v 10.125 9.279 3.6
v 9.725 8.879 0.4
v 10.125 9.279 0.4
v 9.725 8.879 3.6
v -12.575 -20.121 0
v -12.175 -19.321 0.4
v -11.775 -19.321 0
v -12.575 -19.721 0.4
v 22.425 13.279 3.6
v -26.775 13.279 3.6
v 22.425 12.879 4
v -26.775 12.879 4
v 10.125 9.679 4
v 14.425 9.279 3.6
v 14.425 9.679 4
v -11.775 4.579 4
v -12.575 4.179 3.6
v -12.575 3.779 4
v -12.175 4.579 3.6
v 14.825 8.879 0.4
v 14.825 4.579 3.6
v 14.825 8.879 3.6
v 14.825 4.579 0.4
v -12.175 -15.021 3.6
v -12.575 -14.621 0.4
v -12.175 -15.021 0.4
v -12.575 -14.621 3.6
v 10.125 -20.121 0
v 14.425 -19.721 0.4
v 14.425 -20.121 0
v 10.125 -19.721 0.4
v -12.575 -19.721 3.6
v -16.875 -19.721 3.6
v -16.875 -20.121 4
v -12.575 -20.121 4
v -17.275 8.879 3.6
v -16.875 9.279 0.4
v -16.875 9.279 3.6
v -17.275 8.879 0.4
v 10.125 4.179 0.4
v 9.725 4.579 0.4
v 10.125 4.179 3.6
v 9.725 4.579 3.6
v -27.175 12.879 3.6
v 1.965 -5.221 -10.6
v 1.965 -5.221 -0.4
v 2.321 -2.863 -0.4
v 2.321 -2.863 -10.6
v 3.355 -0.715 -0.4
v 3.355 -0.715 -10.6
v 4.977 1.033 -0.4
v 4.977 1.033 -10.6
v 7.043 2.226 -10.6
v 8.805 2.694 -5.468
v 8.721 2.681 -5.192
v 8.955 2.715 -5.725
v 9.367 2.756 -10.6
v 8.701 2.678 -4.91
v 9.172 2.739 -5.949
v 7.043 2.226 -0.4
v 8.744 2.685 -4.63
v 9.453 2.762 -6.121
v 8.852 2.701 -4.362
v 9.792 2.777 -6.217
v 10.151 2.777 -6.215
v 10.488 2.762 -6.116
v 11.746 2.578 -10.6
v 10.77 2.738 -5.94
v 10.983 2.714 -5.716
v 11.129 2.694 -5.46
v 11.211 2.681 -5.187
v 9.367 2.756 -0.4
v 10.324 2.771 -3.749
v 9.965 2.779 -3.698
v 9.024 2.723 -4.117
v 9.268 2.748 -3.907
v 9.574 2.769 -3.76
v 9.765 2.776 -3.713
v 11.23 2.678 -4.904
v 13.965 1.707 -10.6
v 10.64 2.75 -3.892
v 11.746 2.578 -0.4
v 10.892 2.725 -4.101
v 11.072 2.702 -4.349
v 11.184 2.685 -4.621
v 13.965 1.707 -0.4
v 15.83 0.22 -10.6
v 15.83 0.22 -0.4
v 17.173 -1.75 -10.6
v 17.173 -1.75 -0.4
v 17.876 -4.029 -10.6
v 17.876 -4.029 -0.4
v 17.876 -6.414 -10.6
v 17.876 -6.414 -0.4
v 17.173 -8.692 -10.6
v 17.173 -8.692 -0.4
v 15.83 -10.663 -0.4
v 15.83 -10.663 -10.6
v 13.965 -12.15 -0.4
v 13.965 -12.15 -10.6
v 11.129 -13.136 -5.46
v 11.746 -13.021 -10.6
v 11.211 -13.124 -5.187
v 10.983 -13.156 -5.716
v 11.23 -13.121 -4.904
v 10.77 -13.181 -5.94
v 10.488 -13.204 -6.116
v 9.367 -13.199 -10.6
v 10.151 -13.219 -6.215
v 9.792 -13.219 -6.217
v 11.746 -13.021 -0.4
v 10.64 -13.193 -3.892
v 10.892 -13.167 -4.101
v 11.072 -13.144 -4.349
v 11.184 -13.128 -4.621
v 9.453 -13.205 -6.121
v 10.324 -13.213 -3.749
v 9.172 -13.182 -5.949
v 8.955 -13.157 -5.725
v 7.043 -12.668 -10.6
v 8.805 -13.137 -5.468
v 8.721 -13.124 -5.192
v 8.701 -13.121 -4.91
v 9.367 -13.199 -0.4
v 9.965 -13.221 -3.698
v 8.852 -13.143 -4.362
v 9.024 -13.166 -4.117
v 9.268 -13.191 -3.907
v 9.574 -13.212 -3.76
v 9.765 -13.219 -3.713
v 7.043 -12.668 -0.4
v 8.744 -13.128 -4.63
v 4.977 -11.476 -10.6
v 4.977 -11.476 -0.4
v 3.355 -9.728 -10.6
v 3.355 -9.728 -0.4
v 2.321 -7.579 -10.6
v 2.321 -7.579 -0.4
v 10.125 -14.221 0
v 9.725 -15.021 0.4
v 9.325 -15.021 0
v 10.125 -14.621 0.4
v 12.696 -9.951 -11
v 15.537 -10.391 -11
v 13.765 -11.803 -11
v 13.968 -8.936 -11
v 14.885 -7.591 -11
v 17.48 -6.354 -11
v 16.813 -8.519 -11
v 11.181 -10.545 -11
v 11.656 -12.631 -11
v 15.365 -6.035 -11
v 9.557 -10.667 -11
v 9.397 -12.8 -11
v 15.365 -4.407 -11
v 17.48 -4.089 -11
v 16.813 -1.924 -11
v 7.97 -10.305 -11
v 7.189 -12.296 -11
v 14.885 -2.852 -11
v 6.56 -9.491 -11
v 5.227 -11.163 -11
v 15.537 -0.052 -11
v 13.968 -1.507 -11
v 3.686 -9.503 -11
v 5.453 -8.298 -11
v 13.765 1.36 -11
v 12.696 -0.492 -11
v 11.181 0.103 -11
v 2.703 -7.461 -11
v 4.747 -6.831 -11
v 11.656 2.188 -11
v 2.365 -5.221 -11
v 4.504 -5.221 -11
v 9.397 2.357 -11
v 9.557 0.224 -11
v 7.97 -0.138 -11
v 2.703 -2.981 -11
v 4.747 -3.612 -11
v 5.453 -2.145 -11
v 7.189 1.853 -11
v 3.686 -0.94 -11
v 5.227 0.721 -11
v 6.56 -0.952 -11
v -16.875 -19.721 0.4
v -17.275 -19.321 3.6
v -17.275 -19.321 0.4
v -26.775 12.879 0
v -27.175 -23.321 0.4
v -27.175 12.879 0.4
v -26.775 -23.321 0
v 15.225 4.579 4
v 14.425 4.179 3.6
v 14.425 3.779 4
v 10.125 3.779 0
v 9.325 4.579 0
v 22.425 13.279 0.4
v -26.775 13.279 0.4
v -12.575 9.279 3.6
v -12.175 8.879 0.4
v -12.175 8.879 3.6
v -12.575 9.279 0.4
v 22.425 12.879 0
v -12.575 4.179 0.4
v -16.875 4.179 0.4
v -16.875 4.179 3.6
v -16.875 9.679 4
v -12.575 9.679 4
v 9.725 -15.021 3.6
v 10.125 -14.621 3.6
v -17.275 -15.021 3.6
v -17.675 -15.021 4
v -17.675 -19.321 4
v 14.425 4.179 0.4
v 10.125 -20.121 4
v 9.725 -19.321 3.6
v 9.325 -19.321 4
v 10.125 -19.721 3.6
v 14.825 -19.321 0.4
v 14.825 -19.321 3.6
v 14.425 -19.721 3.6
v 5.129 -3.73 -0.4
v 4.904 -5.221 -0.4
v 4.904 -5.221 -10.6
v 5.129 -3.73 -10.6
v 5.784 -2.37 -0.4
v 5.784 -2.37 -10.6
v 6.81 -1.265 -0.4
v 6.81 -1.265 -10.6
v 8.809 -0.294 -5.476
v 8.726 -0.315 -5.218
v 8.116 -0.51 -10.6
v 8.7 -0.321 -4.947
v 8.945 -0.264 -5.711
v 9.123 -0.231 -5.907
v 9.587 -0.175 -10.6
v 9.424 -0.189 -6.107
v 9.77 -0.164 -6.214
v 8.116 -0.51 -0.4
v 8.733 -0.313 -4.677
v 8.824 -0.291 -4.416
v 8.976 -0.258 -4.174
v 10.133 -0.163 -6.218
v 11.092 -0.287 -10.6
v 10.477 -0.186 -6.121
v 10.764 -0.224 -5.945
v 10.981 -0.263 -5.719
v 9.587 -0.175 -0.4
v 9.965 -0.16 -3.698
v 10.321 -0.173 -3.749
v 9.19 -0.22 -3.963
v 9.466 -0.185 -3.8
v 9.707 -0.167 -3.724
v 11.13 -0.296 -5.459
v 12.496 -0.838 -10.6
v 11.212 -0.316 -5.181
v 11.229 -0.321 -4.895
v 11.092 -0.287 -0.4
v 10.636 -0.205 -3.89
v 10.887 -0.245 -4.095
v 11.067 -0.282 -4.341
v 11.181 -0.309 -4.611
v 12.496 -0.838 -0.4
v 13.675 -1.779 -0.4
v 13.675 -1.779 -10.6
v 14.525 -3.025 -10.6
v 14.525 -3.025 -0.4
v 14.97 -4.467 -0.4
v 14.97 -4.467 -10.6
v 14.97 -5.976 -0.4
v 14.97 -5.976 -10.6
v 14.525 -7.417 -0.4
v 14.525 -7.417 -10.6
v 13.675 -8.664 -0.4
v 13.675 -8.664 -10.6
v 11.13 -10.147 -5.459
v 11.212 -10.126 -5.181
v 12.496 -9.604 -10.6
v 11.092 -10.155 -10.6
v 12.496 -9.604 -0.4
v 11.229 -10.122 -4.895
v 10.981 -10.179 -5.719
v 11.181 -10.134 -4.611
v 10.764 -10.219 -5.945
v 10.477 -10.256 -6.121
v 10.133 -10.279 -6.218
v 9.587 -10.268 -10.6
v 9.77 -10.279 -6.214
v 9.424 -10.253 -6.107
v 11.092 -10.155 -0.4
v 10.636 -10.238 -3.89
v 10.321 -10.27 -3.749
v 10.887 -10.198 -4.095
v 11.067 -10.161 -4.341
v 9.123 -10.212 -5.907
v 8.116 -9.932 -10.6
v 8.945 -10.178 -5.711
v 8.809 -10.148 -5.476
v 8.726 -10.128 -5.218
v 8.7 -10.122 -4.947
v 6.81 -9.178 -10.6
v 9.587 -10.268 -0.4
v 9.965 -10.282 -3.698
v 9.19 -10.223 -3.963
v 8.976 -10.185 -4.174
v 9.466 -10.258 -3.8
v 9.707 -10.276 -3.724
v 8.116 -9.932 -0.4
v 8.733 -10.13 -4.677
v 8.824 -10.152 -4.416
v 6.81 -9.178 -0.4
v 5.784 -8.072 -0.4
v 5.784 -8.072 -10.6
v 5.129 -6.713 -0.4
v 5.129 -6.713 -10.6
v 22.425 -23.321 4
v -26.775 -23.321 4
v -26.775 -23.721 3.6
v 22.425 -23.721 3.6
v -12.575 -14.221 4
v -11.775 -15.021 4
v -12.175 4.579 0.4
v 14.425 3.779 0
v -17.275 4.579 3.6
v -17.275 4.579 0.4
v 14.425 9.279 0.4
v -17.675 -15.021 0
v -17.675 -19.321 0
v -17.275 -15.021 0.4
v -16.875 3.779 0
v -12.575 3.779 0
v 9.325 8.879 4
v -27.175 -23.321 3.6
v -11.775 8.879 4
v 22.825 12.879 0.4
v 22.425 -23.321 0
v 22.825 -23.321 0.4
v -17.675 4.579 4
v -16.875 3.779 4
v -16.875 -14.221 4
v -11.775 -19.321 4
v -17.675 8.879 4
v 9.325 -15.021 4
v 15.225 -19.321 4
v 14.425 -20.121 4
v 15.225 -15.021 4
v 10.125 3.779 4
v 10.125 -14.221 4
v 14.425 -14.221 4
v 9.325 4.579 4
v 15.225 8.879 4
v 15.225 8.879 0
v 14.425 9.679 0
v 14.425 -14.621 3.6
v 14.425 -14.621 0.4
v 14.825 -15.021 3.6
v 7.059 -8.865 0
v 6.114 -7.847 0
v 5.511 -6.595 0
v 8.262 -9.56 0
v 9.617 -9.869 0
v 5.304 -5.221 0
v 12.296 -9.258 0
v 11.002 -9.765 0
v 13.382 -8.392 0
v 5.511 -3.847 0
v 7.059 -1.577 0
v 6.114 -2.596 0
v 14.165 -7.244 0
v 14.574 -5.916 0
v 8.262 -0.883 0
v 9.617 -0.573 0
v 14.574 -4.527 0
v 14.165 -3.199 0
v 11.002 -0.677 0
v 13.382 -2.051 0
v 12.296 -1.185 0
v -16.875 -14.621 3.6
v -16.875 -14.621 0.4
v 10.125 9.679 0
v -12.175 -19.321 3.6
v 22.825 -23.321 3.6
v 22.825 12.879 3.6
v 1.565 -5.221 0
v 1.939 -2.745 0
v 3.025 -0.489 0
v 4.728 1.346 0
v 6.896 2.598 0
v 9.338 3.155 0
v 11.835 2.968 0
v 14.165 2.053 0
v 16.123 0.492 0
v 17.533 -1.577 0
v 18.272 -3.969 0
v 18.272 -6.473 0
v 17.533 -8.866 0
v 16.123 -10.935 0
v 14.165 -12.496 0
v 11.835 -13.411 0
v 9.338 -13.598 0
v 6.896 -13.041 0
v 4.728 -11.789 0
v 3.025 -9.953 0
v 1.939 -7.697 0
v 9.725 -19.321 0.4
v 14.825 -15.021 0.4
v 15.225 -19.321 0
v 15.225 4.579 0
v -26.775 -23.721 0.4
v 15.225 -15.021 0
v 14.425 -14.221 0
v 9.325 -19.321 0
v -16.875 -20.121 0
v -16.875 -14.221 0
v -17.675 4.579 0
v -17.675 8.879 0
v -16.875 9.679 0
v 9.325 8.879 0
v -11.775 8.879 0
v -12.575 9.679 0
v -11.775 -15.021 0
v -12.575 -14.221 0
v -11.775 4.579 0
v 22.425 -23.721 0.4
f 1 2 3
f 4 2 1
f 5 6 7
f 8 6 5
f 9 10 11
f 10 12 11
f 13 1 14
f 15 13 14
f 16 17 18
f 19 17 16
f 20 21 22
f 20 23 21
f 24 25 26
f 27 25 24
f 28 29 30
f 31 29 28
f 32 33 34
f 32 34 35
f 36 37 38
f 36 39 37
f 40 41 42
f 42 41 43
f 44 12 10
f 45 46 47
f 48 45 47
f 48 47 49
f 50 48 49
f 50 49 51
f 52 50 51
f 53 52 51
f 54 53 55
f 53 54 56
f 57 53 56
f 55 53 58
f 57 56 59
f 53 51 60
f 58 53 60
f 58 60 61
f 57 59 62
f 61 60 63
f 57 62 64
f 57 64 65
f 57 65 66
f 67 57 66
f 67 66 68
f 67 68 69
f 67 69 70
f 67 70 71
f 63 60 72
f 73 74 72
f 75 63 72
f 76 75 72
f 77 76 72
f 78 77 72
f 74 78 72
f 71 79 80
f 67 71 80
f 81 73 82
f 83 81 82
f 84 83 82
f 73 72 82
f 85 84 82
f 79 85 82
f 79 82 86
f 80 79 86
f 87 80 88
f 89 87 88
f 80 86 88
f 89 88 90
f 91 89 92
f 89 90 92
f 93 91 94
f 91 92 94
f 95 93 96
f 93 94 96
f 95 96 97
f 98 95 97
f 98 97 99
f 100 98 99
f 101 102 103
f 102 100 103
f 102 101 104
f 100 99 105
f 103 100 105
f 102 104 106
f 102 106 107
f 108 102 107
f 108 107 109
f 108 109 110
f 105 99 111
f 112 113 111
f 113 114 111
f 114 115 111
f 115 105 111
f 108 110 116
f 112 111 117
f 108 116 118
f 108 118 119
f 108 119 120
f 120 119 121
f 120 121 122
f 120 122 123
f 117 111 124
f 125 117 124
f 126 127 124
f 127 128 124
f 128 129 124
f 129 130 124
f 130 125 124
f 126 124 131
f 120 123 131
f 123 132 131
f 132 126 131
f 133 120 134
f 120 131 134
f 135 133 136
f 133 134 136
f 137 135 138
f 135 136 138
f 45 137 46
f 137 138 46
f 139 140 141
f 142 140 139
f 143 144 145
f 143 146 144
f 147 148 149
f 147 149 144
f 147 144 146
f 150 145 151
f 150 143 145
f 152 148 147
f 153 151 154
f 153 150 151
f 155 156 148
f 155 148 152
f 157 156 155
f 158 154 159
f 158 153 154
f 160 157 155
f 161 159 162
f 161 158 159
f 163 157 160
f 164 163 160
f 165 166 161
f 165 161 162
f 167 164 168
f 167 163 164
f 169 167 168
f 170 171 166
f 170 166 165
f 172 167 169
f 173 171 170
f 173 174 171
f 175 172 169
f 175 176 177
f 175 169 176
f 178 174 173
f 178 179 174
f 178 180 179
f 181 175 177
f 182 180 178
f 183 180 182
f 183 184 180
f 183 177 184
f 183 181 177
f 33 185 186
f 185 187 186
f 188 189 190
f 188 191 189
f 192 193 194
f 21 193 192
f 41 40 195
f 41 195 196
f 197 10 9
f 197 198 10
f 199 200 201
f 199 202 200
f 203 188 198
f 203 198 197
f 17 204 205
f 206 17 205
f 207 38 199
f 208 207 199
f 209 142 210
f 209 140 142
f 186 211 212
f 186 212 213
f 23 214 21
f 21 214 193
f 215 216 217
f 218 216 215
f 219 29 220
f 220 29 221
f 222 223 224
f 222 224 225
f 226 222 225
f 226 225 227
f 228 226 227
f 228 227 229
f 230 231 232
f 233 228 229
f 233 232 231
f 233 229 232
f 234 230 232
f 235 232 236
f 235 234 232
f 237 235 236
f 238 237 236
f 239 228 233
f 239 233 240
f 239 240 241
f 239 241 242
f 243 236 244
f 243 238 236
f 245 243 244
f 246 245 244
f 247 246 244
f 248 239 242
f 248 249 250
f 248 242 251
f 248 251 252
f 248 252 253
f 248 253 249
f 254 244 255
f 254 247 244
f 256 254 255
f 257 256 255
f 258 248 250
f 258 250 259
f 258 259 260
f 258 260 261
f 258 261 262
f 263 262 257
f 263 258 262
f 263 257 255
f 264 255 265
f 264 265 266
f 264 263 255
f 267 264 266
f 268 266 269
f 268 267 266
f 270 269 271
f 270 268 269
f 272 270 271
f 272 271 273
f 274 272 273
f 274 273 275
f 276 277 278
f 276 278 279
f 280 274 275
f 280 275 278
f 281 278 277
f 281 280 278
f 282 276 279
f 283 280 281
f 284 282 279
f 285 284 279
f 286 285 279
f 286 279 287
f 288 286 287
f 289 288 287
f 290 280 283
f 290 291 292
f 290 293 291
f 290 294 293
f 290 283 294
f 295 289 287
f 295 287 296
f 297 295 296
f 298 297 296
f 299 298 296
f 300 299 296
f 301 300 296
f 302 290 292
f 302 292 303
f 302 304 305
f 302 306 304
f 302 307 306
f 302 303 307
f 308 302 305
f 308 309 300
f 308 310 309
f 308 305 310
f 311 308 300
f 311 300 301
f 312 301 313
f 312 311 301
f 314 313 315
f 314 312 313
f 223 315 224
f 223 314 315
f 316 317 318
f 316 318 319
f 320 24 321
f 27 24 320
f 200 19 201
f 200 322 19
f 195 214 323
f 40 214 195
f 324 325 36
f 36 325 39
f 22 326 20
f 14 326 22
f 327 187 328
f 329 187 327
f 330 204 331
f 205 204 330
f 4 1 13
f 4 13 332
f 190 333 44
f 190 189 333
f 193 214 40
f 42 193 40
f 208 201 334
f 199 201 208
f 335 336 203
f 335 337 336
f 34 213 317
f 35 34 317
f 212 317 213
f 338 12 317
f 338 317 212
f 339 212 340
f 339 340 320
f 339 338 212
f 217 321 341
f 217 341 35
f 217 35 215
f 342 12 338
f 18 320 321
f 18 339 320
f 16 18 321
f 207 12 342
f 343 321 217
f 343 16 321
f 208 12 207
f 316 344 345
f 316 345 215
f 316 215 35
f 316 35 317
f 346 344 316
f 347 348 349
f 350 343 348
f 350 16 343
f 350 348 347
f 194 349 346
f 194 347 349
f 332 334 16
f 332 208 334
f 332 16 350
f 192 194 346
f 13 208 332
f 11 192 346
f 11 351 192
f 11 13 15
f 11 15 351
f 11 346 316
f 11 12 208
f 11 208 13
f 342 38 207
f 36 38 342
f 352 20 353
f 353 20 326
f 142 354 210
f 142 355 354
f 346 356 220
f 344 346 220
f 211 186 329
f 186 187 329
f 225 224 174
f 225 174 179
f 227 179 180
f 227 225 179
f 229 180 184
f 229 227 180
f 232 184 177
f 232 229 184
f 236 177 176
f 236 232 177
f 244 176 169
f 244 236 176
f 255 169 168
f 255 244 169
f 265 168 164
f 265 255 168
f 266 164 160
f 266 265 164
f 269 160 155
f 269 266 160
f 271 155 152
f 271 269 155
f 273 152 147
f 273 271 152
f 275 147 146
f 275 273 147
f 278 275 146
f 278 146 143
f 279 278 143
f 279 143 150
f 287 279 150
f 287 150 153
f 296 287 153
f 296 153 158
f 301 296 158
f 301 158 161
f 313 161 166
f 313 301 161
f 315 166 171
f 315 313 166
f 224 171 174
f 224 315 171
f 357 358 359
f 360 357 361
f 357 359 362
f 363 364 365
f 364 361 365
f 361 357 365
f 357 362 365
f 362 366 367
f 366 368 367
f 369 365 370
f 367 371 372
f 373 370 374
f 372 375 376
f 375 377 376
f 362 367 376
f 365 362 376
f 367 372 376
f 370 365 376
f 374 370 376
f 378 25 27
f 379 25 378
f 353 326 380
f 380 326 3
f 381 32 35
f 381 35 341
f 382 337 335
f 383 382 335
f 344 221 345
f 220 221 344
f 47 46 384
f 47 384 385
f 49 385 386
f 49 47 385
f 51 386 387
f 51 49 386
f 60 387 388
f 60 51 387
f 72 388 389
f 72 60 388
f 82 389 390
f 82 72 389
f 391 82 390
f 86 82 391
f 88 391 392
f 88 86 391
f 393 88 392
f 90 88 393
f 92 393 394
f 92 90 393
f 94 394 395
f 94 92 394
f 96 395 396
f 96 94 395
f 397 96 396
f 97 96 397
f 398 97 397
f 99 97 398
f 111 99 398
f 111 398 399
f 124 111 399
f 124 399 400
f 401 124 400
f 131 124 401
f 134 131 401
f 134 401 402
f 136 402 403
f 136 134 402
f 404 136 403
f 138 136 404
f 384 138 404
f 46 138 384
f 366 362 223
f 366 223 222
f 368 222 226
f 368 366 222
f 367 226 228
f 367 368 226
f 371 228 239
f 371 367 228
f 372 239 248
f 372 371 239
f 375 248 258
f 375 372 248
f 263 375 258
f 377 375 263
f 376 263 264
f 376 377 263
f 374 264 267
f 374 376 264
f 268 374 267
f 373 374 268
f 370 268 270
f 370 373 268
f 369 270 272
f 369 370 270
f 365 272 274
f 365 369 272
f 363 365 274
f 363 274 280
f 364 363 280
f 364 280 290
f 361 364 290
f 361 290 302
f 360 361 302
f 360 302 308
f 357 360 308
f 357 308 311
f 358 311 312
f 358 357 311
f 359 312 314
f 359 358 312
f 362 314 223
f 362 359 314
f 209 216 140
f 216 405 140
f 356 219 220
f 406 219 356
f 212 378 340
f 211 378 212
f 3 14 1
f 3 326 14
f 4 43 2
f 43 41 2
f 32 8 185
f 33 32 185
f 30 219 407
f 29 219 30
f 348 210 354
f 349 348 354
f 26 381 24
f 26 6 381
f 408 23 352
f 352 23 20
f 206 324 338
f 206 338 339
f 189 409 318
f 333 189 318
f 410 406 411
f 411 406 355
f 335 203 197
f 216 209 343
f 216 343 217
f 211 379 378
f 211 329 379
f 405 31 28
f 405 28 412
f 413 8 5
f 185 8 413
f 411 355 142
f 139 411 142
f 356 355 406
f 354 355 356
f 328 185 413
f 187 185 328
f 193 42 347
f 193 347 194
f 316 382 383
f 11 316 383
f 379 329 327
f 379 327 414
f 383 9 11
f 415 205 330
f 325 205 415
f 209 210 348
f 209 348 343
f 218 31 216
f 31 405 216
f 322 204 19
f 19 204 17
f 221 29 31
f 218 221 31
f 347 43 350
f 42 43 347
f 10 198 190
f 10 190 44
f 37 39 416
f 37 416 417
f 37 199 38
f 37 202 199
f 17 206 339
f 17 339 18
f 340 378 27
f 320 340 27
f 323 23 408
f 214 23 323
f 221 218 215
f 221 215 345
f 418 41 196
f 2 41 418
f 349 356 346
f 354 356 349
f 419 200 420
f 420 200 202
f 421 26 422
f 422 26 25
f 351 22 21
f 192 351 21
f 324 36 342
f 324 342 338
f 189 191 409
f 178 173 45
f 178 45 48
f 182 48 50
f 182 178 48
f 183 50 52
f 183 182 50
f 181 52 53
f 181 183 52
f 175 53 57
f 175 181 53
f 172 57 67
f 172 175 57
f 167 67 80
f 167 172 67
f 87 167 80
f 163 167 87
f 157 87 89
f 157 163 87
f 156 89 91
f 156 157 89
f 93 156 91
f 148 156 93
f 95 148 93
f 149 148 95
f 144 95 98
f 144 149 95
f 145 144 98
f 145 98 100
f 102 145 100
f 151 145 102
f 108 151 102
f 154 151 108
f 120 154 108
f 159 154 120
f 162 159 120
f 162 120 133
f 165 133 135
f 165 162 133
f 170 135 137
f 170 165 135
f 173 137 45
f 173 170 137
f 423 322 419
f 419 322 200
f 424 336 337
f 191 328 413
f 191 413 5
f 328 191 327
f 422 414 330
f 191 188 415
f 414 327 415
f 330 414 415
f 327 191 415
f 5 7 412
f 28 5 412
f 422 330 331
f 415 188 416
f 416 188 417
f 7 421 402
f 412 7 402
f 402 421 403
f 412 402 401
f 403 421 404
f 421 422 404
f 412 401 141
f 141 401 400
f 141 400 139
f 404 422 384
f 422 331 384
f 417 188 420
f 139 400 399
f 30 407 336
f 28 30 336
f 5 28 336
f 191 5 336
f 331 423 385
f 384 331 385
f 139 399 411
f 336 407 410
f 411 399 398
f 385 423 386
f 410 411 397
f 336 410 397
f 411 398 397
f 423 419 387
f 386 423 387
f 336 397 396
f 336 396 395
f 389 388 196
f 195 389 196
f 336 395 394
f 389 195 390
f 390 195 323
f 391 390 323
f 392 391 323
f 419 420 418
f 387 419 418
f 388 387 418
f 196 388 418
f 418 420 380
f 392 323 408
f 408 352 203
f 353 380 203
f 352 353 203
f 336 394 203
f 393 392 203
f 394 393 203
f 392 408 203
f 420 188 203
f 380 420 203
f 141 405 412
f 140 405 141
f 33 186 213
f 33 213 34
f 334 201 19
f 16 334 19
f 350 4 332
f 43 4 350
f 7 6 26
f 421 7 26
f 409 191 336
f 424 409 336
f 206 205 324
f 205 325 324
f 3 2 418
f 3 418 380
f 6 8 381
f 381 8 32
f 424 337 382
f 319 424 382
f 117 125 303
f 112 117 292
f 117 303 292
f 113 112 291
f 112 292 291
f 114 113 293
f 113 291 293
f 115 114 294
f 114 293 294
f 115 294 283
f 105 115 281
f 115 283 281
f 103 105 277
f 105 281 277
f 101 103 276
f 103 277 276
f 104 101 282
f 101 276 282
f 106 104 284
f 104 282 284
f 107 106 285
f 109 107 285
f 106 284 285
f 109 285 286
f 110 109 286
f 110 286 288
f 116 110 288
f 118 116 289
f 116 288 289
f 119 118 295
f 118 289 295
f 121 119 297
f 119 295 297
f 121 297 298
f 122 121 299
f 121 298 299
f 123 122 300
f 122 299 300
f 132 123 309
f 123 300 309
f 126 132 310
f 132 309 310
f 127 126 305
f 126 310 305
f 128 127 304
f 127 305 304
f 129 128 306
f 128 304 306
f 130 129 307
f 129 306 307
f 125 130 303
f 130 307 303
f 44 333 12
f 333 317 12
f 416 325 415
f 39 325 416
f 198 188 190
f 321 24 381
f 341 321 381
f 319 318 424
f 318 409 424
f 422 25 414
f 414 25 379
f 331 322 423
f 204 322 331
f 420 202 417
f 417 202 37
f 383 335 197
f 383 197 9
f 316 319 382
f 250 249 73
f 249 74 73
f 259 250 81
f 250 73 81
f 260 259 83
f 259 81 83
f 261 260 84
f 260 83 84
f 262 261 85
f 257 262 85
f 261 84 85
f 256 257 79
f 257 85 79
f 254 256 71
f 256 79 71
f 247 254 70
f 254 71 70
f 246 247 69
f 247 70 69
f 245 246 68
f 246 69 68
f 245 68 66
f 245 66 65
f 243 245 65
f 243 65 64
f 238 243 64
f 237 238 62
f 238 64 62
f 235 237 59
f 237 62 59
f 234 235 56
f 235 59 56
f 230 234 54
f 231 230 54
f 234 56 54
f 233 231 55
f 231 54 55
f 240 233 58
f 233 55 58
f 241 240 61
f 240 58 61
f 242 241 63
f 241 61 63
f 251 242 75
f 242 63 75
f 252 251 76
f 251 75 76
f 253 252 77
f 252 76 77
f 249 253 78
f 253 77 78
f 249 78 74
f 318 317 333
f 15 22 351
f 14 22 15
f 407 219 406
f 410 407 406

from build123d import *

# Parameters (mm, degrees)
SKIZZE1_W                       = 50
SKIZZE1_H                       = 37
AUFSATZ_LINEAR_AUSTRAGEN1_DEPTH = 4
SKIZZE2_W                       = 5.1
SKIZZE2_H                       = 5.1
SCHNITT_LINEAR_AUSTRAGEN1_DEPTH = 37.293175992
SKIZZE3_R                       = 8
SKIZZE3_R_2                     = 5.060953285
AUFSATZ_LINEAR_AUSTRAGEN2_DEPTH = 11
FASE1_SIZE                      = 0.4
SKIZZE4_R                       = 1.265577593
SCHNITT_LINEAR_AUSTRAGEN2_DEPTH = 100


with BuildPart() as part:
    # Skizze1 → Aufsatz-Linear austragen1 (new body)
    with BuildSketch(Plane.XY):
        with Locations((-2.175232088, -5.221327631)):
            Rectangle(SKIZZE1_W, SKIZZE1_H)
    extrude(amount=AUFSATZ_LINEAR_AUSTRAGEN1_DEPTH)

    # Skizze2 → Schnitt-Linear austragen1 (cut, through all)
    with BuildSketch(Plane(origin=(0, 0, 0), x_dir=(-1, 0, 0), z_dir=(0, 0, -1))):
        with Locations((14.725232088, 6.728672369)):
            Rectangle(SKIZZE2_W, SKIZZE2_H)
        with Locations((-12.274767912, 6.728672369)):
            Rectangle(SKIZZE2_W, SKIZZE2_H)
        with Locations((-12.274767912, -17.171327631)):
            Rectangle(SKIZZE2_W, SKIZZE2_H)
        with Locations((14.725232088, -17.171327631)):
            Rectangle(SKIZZE2_W, SKIZZE2_H)
    extrude(amount=-SCHNITT_LINEAR_AUSTRAGEN1_DEPTH, mode=Mode.SUBTRACT)

    # Skizze3 → Aufsatz-Linear austragen2 (add)
    with BuildSketch(Plane(origin=(0, 0, 0), x_dir=(-1, 0, 0), z_dir=(0, 0, -1))):
        with Locations((-9.965334645, -5.221327631)):
            Circle(SKIZZE3_R)
        with Locations((-9.965334645, -5.221327631)):
            Circle(SKIZZE3_R_2, mode=Mode.SUBTRACT)
    extrude(amount=AUFSATZ_LINEAR_AUSTRAGEN2_DEPTH)

    # Fase1
    fase1_edges = [part.edges().sort_by_distance(p)[0] for p in [
        (-2.175232088, 13.278672369, 4),
        (-27.175232088, -5.221327631, 4),
        (-12.175232088, 6.728672369, 4),
        (-12.175232088, 4.178672369, 2),
        (-14.725232088, 9.278672369, 4),
        (-12.175232088, 9.278672369, 2),
        (-17.275232088, 6.728672369, 4),
        (-17.275232088, 9.278672369, 2),
        (-14.725232088, 4.178672369, 4),
        (-17.275232088, 4.178672369, 2),
        (-12.175232088, 6.728672369, 0),
        (-14.725232088, 4.178672369, 0),
        (-17.275232088, 6.728672369, 0),
        (-14.725232088, 9.278672369, 0),
        (14.824767912, -17.171327631, 4),
        (14.824767912, -19.721327631, 2),
        (12.274767912, -14.621327631, 4),
        (14.824767912, -14.621327631, 2),
        (9.724767912, -17.171327631, 4),
        (9.724767912, -14.621327631, 2),
        (12.274767912, -19.721327631, 4),
        (9.724767912, -19.721327631, 2),
        (14.824767912, -17.171327631, 0),
        (12.274767912, -19.721327631, 0),
        (9.724767912, -17.171327631, 0),
        (12.274767912, -14.621327631, 0),
        (-12.175232088, -17.171327631, 4),
        (-12.175232088, -19.721327631, 2),
        (-14.725232088, -14.621327631, 4),
        (-12.175232088, -14.621327631, 2),
        (-17.275232088, -17.171327631, 4),
        (-17.275232088, -14.621327631, 2),
        (-14.725232088, -19.721327631, 4),
        (-17.275232088, -19.721327631, 2),
        (-12.175232088, -17.171327631, 0),
        (-14.725232088, -19.721327631, 0),
        (-17.275232088, -17.171327631, 0),
        (-14.725232088, -14.621327631, 0),
        (14.824767912, 6.728672369, 4),
        (14.824767912, 4.178672369, 2),
        (12.274767912, 9.278672369, 4),
        (-2.175232088, -23.721327631, 4),
        (-27.175232088, -5.221327631, 0),
        (14.824767912, 9.278672369, 2),
        (9.724767912, 6.728672369, 4),
        (9.724767912, 9.278672369, 2),
        (12.274767912, 4.178672369, 4),
        (9.724767912, 4.178672369, 2),
        (14.824767912, 6.728672369, 0),
        (12.274767912, 4.178672369, 0),
        (9.724767912, 6.728672369, 0),
        (12.274767912, 9.278672369, 0),
        (-2.175232088, 13.278672369, 0),
        (22.824767912, -5.221327631, 0),
        (-2.175232088, -23.721327631, 0),
        (15.02628793, -5.221327631, 0),
        (17.965334645, -5.221327631, -11),
        (17.965334645, -5.221327631, 0),
        (-27.175232088, -23.721327631, 2),
        (15.02628793, -5.221327631, -11),
        (-27.175232088, 13.278672369, 2),
        (22.824767912, 13.278672369, 2),
        (22.824767912, -23.721327631, 2),
        (22.824767912, -5.221327631, 4),
    ]]
    chamfer(fase1_edges, length=FASE1_SIZE)

    # Skizze4 → Schnitt-Linear austragen2 (cut, symmetric)
    with BuildSketch(Plane(origin=(0, 0, 0), x_dir=(1, 0, 0), z_dir=(0, 1, 0))):
        with Locations(Location((9.965334645, 4.963129901, 0), (0, 0, 270))):
            Circle(SKIZZE4_R)
    extrude(amount=SCHNITT_LINEAR_AUSTRAGEN2_DEPTH, both=True, mode=Mode.SUBTRACT)


solid = part.part
